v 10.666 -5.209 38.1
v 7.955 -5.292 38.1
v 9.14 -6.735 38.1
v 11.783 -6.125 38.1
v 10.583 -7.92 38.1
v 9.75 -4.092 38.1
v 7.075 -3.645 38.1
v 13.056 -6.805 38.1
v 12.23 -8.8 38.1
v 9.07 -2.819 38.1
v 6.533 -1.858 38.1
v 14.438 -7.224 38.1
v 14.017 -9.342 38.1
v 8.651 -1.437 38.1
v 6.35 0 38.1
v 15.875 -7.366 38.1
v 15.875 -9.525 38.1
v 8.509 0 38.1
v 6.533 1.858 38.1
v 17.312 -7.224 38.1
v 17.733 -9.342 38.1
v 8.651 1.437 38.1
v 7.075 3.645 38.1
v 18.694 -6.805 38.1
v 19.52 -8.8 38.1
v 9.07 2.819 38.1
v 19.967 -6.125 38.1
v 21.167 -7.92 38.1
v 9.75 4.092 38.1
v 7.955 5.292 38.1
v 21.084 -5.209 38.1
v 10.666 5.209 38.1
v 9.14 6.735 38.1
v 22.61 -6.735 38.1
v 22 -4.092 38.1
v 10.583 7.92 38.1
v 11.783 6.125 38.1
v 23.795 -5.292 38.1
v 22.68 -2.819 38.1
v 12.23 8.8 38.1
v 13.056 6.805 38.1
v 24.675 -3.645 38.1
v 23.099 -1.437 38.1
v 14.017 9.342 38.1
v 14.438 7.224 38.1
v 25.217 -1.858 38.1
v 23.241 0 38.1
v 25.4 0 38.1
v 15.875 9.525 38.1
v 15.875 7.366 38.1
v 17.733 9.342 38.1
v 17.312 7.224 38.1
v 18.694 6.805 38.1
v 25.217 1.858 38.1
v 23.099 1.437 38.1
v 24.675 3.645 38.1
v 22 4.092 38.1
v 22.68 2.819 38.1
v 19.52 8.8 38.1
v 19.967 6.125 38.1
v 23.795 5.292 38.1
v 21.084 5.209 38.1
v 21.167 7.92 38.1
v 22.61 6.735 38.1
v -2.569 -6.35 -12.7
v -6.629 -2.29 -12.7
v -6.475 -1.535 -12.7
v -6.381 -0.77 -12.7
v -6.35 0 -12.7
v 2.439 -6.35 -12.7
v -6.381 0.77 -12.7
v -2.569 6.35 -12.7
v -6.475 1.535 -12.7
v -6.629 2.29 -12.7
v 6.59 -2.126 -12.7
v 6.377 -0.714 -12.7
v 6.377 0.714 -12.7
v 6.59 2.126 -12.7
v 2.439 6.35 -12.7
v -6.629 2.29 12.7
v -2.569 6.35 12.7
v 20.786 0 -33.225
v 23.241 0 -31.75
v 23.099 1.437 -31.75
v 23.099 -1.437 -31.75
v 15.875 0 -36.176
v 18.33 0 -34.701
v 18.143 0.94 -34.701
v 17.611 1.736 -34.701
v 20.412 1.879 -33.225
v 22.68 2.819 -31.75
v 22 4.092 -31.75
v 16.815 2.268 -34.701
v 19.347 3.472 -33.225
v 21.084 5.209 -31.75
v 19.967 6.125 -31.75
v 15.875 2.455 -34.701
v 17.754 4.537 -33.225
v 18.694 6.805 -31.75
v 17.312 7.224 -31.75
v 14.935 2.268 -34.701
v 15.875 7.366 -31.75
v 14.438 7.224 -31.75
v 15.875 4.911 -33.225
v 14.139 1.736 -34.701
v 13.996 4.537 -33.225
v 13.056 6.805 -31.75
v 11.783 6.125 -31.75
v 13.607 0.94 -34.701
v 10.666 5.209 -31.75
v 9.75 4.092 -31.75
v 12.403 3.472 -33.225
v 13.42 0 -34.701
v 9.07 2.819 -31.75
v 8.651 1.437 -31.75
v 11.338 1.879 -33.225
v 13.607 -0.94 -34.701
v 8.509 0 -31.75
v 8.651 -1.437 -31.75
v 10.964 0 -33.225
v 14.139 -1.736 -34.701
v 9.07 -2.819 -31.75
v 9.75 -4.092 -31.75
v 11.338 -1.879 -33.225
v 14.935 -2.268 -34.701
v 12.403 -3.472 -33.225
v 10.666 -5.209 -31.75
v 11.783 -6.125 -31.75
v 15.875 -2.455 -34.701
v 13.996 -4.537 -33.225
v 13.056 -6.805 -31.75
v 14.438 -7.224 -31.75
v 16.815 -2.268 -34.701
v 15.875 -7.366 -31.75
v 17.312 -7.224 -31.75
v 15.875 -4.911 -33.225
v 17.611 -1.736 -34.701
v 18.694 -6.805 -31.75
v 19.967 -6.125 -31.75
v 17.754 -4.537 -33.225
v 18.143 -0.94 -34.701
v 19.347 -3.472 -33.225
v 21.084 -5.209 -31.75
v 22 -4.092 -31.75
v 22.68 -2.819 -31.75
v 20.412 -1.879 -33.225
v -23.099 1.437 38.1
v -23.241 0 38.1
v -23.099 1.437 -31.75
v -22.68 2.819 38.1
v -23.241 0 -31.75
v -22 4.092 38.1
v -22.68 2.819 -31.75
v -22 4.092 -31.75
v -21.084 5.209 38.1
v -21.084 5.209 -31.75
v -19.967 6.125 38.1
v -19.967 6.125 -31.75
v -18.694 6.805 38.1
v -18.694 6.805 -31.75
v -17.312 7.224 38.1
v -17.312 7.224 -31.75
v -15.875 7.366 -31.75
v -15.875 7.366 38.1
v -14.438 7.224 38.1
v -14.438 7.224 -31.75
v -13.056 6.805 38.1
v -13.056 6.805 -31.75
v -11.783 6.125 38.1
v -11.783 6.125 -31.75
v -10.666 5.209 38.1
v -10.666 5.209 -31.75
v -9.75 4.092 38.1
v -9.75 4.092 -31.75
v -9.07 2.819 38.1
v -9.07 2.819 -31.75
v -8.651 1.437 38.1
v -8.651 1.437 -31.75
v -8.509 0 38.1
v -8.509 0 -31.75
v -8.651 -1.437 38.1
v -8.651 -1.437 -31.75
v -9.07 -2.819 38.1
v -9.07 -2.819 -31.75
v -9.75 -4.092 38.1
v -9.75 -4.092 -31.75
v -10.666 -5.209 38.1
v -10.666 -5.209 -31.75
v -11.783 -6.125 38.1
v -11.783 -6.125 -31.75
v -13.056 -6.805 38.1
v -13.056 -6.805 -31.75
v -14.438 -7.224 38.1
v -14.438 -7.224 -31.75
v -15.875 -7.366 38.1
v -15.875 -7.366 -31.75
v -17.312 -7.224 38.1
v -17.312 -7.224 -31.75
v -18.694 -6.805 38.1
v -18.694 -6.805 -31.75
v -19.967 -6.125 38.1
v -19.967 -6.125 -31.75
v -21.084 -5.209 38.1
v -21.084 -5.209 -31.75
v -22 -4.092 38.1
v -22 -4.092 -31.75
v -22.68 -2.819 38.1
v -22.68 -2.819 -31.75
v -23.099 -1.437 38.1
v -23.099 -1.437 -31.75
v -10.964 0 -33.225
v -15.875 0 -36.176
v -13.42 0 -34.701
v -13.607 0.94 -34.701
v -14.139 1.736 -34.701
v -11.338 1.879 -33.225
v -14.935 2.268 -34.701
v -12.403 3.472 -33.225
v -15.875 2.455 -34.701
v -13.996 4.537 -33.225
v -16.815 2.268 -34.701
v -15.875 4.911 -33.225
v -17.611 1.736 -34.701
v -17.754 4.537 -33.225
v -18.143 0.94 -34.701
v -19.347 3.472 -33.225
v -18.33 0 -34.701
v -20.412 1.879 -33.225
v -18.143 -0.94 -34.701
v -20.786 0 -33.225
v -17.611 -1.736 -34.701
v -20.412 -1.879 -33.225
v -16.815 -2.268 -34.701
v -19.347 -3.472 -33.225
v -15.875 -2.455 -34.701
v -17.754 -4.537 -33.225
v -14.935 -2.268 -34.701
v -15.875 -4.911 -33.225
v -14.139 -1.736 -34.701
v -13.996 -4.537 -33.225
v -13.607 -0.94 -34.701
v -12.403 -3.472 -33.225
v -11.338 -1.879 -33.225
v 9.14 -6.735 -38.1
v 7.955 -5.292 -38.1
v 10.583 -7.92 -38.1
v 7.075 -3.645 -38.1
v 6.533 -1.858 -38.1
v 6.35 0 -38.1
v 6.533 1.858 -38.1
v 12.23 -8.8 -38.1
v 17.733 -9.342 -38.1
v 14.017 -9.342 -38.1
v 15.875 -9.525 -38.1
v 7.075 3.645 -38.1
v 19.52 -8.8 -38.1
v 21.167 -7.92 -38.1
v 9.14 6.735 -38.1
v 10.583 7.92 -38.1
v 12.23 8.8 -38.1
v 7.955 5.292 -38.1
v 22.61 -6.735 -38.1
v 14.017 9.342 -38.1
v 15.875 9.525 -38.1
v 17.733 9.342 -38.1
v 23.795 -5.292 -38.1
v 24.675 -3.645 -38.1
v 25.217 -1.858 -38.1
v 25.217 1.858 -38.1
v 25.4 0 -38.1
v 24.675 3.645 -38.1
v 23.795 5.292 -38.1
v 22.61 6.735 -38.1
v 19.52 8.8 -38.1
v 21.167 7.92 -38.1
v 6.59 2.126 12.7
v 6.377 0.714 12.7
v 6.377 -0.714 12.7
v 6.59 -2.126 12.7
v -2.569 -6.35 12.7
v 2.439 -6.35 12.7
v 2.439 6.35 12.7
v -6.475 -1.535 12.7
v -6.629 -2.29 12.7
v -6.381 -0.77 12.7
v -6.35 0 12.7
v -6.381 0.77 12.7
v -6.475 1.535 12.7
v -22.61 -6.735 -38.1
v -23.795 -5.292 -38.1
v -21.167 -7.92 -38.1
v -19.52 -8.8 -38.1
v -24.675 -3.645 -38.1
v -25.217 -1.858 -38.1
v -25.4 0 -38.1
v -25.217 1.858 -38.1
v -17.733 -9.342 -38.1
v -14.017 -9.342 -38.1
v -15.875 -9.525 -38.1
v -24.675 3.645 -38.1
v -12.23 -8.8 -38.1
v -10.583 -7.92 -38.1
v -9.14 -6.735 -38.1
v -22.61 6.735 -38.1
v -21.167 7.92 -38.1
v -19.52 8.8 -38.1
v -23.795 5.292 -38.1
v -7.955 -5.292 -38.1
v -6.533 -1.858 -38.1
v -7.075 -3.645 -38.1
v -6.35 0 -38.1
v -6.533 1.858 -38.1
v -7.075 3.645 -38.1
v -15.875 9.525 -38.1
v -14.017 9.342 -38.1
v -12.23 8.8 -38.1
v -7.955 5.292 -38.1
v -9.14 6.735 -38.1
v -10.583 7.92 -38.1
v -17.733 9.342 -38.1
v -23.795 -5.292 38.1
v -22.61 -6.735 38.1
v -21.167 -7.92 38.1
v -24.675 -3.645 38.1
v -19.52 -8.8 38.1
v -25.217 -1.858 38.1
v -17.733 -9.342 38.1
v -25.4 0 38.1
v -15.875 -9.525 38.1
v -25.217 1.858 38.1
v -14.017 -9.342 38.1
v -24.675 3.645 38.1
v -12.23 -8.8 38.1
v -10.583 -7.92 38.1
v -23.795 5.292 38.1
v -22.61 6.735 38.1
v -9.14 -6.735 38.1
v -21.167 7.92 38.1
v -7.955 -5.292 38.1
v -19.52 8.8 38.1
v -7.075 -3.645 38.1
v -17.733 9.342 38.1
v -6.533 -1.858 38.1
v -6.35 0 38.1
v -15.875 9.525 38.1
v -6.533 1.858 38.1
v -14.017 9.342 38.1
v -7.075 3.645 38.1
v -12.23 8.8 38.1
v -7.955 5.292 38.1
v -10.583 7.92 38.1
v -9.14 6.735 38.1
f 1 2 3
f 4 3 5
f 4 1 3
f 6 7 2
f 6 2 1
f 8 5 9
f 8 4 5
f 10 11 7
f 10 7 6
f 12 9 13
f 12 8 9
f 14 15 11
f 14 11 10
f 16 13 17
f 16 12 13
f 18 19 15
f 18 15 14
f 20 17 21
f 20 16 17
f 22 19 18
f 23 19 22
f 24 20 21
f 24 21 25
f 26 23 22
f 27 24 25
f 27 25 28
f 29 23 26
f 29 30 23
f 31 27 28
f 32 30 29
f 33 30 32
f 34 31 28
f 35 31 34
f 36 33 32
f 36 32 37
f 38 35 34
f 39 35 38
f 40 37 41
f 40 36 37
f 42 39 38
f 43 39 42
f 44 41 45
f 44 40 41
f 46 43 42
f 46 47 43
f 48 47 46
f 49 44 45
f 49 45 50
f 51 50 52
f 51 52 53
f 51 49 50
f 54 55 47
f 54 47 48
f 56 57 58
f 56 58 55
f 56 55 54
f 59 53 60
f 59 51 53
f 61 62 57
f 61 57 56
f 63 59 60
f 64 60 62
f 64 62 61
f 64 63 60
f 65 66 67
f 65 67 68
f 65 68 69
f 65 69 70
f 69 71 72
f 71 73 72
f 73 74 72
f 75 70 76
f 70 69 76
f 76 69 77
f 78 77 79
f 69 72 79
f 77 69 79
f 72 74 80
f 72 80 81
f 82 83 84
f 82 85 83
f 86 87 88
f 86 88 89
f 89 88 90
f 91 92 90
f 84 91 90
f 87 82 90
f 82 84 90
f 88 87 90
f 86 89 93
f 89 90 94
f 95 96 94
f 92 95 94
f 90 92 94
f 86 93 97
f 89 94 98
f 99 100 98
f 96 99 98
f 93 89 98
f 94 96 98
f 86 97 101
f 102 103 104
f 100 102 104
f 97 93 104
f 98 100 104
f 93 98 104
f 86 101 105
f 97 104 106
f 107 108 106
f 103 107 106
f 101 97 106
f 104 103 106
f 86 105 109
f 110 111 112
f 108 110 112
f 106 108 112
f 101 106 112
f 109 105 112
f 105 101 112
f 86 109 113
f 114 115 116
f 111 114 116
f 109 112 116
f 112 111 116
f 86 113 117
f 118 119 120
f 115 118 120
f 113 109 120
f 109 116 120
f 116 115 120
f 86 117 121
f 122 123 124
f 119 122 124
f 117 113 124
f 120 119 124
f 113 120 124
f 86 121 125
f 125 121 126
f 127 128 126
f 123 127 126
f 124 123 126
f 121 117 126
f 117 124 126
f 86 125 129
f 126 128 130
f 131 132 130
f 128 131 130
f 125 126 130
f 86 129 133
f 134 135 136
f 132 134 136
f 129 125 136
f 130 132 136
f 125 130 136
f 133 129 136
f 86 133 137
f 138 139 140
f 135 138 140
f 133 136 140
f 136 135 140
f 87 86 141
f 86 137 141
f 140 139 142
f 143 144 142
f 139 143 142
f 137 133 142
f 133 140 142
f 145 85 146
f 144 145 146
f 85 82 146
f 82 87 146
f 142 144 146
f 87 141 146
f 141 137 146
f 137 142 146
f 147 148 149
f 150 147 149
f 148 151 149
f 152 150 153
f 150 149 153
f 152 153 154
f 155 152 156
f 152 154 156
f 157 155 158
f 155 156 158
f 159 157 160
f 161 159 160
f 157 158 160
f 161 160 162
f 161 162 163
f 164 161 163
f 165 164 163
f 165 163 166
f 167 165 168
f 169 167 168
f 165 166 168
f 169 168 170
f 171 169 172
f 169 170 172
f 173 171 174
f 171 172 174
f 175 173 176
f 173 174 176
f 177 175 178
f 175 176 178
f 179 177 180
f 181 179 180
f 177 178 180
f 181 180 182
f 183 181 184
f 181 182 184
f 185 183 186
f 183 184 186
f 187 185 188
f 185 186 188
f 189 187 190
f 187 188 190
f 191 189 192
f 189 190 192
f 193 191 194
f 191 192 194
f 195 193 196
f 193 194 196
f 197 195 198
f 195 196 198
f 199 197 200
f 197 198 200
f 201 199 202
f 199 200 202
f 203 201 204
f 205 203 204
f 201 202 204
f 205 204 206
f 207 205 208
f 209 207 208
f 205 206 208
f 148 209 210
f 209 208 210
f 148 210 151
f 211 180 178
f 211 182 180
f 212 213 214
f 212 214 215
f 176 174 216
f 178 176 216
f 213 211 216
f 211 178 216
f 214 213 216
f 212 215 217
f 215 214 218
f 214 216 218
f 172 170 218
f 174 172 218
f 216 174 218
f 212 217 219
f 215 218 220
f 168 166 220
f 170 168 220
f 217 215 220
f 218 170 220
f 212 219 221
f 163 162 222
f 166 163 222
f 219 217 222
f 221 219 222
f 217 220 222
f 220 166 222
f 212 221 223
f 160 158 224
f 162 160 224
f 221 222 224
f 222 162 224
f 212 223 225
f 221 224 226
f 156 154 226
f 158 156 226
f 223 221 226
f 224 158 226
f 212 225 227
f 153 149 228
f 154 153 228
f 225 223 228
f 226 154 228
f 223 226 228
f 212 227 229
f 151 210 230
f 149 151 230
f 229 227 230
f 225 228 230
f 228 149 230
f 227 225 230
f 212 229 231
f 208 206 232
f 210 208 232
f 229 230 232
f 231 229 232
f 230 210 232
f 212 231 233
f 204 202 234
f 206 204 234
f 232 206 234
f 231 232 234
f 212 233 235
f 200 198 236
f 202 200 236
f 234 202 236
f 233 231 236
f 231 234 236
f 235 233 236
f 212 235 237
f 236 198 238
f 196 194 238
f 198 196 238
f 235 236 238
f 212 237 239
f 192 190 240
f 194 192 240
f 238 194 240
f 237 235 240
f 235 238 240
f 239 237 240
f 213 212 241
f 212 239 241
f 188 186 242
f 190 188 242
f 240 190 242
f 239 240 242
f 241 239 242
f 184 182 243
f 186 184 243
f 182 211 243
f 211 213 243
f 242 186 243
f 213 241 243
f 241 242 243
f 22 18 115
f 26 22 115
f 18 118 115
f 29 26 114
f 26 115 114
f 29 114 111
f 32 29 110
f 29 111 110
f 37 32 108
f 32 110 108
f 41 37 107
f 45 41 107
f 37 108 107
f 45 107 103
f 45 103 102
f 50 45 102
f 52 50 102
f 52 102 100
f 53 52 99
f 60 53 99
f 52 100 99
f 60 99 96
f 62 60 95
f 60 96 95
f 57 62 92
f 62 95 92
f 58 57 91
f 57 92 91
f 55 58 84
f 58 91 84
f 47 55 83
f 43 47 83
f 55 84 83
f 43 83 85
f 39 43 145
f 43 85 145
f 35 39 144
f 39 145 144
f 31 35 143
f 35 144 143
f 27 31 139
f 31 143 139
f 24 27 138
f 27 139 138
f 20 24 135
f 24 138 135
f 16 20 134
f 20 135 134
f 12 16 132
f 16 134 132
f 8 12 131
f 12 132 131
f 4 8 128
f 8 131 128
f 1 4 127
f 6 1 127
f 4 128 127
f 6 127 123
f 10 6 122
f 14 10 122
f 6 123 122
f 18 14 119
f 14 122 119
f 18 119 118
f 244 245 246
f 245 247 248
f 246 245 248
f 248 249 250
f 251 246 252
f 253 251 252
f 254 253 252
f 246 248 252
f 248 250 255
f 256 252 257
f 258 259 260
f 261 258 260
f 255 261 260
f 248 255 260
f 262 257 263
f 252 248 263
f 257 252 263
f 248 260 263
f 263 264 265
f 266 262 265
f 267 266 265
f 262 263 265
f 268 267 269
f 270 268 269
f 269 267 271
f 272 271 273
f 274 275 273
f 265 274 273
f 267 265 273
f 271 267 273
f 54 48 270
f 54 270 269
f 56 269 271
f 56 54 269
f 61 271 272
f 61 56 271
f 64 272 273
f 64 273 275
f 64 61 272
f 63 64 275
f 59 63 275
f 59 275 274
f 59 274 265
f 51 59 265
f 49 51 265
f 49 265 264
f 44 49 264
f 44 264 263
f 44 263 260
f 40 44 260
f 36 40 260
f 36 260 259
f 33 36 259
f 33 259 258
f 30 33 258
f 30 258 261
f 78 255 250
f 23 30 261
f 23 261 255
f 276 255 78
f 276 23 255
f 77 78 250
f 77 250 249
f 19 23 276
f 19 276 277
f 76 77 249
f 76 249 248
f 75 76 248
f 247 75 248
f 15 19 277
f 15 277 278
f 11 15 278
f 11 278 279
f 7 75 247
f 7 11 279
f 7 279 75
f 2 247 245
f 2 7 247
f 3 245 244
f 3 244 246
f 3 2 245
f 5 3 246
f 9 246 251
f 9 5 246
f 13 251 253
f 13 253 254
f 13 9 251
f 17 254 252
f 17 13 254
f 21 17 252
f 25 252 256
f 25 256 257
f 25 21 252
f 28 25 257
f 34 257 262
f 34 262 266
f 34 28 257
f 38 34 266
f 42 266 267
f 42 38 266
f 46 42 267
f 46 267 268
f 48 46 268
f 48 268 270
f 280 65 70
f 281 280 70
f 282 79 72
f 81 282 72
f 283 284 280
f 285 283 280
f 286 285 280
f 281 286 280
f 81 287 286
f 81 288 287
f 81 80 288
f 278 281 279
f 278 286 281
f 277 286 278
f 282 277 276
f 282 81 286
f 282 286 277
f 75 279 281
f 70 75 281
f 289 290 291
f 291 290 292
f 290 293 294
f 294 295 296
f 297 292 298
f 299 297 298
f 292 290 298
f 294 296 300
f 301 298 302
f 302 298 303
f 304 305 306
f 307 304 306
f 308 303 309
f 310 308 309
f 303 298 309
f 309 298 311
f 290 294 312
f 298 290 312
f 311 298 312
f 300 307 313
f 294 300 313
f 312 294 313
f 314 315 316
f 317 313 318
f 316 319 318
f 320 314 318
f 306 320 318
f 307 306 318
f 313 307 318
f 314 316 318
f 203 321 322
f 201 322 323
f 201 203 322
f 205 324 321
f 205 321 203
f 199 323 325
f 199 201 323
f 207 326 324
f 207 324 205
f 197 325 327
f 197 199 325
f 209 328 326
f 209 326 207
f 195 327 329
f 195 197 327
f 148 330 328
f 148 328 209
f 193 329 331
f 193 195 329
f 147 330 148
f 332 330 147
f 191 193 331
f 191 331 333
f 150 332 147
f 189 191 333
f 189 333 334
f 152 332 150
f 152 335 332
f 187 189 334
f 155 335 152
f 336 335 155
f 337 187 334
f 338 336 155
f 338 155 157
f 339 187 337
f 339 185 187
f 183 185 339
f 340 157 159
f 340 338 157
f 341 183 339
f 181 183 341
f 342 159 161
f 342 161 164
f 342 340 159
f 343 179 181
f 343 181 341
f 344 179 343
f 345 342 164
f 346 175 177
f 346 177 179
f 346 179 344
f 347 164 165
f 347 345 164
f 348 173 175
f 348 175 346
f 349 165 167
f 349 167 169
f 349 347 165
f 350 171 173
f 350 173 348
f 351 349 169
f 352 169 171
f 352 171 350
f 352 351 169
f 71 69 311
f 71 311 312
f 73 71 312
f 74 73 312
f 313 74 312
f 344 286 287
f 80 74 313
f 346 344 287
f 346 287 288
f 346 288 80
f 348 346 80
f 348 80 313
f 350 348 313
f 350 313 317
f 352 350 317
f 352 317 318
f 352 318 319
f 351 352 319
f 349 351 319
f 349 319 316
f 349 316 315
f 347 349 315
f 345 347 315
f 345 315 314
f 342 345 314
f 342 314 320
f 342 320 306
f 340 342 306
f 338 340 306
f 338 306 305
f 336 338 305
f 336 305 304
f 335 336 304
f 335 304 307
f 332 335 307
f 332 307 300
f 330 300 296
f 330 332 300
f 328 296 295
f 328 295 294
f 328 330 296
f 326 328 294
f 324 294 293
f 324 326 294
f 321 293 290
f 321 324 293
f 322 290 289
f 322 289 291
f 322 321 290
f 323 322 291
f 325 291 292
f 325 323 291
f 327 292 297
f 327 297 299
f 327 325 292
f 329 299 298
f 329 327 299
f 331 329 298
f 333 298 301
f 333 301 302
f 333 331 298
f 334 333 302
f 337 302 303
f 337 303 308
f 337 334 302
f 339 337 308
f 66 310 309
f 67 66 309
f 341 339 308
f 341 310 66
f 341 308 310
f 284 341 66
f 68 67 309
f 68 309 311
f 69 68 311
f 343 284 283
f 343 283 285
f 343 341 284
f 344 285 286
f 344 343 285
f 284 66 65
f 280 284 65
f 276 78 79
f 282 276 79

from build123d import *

# Parameters (mm, degrees)
F0_R           = 9.525
F1_DEPTH       = 38.1
F4_W           = 7.6494621422
F4_H           = 6.35
F5_DEPTH       = 12.7
F8_D           = 14.732
F8_DEPTH       = 69.85
F8_TIP         = 4.4259393198
F8_ON_F7_D     = 14.732
F8_ON_F7_DEPTH = 69.85
F8_ON_F7_TIP   = 4.4259393198
F9_T4_DEPTH    = 51.5282991577
F9_S5_R        = 9.525
F9_T6_DEPTH    = 28
F9_T10_DEPTH   = 51.965031671
F9_S11_R       = 9.525
F9_T12_DEPTH   = 28
F9_T16_DEPTH   = 51.965031671
F9_S17_R       = 9.525
F9_T18_DEPTH   = 28
F9_T22_DEPTH   = 51.5282991577
F9_S23_R       = 9.525
F9_T24_DEPTH   = 28


# Not quite as in the source:
# - a fillet or chamfer that OpenCascade refuses, or shapes differently, is made with other operations: its cross-section is extruded or revolved along the edge and cut away or added
# - a feature of the source that left no trace in its solid (it failed there, or was rolled back) is left out


with BuildPart() as f1:
    # F0 (on Top) → F1 (new body, symmetric)
    with BuildSketch(Plane.XY):
        with Locations((-15.875, 0)):
            Circle(F0_R)
    extrude(amount=F1_DEPTH, both=True)



with BuildPart() as f1b:
    # F0 (on Top) → F1, piece 2 (new body, symmetric)
    with BuildSketch(Plane.XY):
        with Locations((15.875, 0)):
            Circle(F0_R)
    extrude(amount=F1_DEPTH, both=True)


with BuildPart() as f1_1:
    add(f1.part)

    add(f1b.part)  # F5 merges F1b
    # F4 (on Top) → F5 (join, symmetric)
    with BuildSketch(Plane.XY):
        with Locations((-3.8247310711, 3.175)):
            Rectangle(F4_W, F4_H)
        Polygon((7.4973143637, 0), (0, 0), (0, -6.35), (7.6071062533, -6.35), align=None)
        Polygon((0, 6.35), (0, 0), (7.4973143637, 0), (7.6071062533, 6.35), align=None)
        with Locations((-3.8247310711, -3.175)):
            Rectangle(F4_W, F4_H)
    extrude(amount=F5_DEPTH, both=True)

    # F8
    with Locations(Plane.XY.offset(38.1)):
        with Locations((-15.875, 0)):
            Hole(F8_D / 2, depth=F8_DEPTH)
            with Locations((0, 0, -(F8_DEPTH + F8_TIP / 2))):  # 118° drill point
                Cone(0, F8_D / 2, F8_TIP, mode=Mode.SUBTRACT)

    # F8 on F7
    with Locations(Plane.XY.offset(38.1)):
        with Locations((15.875, 0)):
            Hole(F8_ON_F7_D / 2, depth=F8_ON_F7_DEPTH)
            with Locations((0, 0, -(F8_ON_F7_DEPTH + F8_ON_F7_TIP / 2))):  # 118° drill point
                Cone(0, F8_ON_F7_D / 2, F8_ON_F7_TIP, mode=Mode.SUBTRACT)

    # F9: chamfer of 5.08 on 4 edges, made by hand


with BuildPart() as f9_tool2:
    # F9_s3 → F9_t4 (new body)
    with BuildSketch(Plane.XY.offset(25.7641495789)):
        Polygon((-7.6494621422, -1.27), (-2.5694621422, -6.35), (-7.6494621422, -6.35), align=None)
    extrude(amount=-F9_T4_DEPTH)

    # F9_s5 → F9_t6 (cut, symmetric)
    with BuildSketch(Plane.XY):
        with Locations((-15.875, 0)):
            Circle(F9_S5_R)
    extrude(amount=F9_T6_DEPTH, both=True, mode=Mode.SUBTRACT)


with BuildPart() as f1_2:
    add(f1_1.part)

    # F9_t1: cut F9_tool2
    add(f9_tool2.part, mode=Mode.SUBTRACT)


with BuildPart() as f9_tool8:
    # F9_s9 → F9_t10 (new body)
    with BuildSketch(Plane.XY.offset(25.9825158355)):
        Polygon((7.5177543218, -1.1821796141), (2.438513475, -6.35), (7.6071062533, -6.35), align=None)
    extrude(amount=-F9_T10_DEPTH)

    # F9_s11 → F9_t12 (cut, symmetric)
    with BuildSketch(Plane.XY):
        with Locations((15.875, 0)):
            Circle(F9_S11_R)
    extrude(amount=F9_T12_DEPTH, both=True, mode=Mode.SUBTRACT)


with BuildPart() as f1_3:
    add(f1_2.part)

    # F9_t7: cut F9_tool8
    add(f9_tool8.part, mode=Mode.SUBTRACT)


with BuildPart() as f9_tool14:
    # F9_s15 → F9_t16 (new body)
    with BuildSketch(Plane.XY.offset(-25.9825158355)):
        Polygon((7.5177543218, 1.1821796141), (2.438513475, 6.35), (7.6071062533, 6.35), align=None)
    extrude(amount=F9_T16_DEPTH)

    # F9_s17 → F9_t18 (cut, symmetric)
    with BuildSketch(Plane.XY):
        with Locations((15.875, 0)):
            Circle(F9_S17_R)
    extrude(amount=F9_T18_DEPTH, both=True, mode=Mode.SUBTRACT)


with BuildPart() as f1_4:
    add(f1_3.part)

    # F9_t13: cut F9_tool14
    add(f9_tool14.part, mode=Mode.SUBTRACT)


with BuildPart() as f9_tool20:
    # F9_s21 → F9_t22 (new body)
    with BuildSketch(Plane.XY.offset(25.7641495789)):
        Polygon((-7.6494621422, 1.27), (-2.5694621422, 6.35), (-7.6494621422, 6.35), align=None)
    extrude(amount=-F9_T22_DEPTH)

    # F9_s23 → F9_t24 (cut, symmetric)
    with BuildSketch(Plane.XY):
        with Locations((-15.875, 0)):
            Circle(F9_S23_R)
    extrude(amount=F9_T24_DEPTH, both=True, mode=Mode.SUBTRACT)


with BuildPart() as f1_5:
    add(f1_4.part)

    # F9_t19: cut F9_tool20
    add(f9_tool20.part, mode=Mode.SUBTRACT)


solid = f1_5.part
